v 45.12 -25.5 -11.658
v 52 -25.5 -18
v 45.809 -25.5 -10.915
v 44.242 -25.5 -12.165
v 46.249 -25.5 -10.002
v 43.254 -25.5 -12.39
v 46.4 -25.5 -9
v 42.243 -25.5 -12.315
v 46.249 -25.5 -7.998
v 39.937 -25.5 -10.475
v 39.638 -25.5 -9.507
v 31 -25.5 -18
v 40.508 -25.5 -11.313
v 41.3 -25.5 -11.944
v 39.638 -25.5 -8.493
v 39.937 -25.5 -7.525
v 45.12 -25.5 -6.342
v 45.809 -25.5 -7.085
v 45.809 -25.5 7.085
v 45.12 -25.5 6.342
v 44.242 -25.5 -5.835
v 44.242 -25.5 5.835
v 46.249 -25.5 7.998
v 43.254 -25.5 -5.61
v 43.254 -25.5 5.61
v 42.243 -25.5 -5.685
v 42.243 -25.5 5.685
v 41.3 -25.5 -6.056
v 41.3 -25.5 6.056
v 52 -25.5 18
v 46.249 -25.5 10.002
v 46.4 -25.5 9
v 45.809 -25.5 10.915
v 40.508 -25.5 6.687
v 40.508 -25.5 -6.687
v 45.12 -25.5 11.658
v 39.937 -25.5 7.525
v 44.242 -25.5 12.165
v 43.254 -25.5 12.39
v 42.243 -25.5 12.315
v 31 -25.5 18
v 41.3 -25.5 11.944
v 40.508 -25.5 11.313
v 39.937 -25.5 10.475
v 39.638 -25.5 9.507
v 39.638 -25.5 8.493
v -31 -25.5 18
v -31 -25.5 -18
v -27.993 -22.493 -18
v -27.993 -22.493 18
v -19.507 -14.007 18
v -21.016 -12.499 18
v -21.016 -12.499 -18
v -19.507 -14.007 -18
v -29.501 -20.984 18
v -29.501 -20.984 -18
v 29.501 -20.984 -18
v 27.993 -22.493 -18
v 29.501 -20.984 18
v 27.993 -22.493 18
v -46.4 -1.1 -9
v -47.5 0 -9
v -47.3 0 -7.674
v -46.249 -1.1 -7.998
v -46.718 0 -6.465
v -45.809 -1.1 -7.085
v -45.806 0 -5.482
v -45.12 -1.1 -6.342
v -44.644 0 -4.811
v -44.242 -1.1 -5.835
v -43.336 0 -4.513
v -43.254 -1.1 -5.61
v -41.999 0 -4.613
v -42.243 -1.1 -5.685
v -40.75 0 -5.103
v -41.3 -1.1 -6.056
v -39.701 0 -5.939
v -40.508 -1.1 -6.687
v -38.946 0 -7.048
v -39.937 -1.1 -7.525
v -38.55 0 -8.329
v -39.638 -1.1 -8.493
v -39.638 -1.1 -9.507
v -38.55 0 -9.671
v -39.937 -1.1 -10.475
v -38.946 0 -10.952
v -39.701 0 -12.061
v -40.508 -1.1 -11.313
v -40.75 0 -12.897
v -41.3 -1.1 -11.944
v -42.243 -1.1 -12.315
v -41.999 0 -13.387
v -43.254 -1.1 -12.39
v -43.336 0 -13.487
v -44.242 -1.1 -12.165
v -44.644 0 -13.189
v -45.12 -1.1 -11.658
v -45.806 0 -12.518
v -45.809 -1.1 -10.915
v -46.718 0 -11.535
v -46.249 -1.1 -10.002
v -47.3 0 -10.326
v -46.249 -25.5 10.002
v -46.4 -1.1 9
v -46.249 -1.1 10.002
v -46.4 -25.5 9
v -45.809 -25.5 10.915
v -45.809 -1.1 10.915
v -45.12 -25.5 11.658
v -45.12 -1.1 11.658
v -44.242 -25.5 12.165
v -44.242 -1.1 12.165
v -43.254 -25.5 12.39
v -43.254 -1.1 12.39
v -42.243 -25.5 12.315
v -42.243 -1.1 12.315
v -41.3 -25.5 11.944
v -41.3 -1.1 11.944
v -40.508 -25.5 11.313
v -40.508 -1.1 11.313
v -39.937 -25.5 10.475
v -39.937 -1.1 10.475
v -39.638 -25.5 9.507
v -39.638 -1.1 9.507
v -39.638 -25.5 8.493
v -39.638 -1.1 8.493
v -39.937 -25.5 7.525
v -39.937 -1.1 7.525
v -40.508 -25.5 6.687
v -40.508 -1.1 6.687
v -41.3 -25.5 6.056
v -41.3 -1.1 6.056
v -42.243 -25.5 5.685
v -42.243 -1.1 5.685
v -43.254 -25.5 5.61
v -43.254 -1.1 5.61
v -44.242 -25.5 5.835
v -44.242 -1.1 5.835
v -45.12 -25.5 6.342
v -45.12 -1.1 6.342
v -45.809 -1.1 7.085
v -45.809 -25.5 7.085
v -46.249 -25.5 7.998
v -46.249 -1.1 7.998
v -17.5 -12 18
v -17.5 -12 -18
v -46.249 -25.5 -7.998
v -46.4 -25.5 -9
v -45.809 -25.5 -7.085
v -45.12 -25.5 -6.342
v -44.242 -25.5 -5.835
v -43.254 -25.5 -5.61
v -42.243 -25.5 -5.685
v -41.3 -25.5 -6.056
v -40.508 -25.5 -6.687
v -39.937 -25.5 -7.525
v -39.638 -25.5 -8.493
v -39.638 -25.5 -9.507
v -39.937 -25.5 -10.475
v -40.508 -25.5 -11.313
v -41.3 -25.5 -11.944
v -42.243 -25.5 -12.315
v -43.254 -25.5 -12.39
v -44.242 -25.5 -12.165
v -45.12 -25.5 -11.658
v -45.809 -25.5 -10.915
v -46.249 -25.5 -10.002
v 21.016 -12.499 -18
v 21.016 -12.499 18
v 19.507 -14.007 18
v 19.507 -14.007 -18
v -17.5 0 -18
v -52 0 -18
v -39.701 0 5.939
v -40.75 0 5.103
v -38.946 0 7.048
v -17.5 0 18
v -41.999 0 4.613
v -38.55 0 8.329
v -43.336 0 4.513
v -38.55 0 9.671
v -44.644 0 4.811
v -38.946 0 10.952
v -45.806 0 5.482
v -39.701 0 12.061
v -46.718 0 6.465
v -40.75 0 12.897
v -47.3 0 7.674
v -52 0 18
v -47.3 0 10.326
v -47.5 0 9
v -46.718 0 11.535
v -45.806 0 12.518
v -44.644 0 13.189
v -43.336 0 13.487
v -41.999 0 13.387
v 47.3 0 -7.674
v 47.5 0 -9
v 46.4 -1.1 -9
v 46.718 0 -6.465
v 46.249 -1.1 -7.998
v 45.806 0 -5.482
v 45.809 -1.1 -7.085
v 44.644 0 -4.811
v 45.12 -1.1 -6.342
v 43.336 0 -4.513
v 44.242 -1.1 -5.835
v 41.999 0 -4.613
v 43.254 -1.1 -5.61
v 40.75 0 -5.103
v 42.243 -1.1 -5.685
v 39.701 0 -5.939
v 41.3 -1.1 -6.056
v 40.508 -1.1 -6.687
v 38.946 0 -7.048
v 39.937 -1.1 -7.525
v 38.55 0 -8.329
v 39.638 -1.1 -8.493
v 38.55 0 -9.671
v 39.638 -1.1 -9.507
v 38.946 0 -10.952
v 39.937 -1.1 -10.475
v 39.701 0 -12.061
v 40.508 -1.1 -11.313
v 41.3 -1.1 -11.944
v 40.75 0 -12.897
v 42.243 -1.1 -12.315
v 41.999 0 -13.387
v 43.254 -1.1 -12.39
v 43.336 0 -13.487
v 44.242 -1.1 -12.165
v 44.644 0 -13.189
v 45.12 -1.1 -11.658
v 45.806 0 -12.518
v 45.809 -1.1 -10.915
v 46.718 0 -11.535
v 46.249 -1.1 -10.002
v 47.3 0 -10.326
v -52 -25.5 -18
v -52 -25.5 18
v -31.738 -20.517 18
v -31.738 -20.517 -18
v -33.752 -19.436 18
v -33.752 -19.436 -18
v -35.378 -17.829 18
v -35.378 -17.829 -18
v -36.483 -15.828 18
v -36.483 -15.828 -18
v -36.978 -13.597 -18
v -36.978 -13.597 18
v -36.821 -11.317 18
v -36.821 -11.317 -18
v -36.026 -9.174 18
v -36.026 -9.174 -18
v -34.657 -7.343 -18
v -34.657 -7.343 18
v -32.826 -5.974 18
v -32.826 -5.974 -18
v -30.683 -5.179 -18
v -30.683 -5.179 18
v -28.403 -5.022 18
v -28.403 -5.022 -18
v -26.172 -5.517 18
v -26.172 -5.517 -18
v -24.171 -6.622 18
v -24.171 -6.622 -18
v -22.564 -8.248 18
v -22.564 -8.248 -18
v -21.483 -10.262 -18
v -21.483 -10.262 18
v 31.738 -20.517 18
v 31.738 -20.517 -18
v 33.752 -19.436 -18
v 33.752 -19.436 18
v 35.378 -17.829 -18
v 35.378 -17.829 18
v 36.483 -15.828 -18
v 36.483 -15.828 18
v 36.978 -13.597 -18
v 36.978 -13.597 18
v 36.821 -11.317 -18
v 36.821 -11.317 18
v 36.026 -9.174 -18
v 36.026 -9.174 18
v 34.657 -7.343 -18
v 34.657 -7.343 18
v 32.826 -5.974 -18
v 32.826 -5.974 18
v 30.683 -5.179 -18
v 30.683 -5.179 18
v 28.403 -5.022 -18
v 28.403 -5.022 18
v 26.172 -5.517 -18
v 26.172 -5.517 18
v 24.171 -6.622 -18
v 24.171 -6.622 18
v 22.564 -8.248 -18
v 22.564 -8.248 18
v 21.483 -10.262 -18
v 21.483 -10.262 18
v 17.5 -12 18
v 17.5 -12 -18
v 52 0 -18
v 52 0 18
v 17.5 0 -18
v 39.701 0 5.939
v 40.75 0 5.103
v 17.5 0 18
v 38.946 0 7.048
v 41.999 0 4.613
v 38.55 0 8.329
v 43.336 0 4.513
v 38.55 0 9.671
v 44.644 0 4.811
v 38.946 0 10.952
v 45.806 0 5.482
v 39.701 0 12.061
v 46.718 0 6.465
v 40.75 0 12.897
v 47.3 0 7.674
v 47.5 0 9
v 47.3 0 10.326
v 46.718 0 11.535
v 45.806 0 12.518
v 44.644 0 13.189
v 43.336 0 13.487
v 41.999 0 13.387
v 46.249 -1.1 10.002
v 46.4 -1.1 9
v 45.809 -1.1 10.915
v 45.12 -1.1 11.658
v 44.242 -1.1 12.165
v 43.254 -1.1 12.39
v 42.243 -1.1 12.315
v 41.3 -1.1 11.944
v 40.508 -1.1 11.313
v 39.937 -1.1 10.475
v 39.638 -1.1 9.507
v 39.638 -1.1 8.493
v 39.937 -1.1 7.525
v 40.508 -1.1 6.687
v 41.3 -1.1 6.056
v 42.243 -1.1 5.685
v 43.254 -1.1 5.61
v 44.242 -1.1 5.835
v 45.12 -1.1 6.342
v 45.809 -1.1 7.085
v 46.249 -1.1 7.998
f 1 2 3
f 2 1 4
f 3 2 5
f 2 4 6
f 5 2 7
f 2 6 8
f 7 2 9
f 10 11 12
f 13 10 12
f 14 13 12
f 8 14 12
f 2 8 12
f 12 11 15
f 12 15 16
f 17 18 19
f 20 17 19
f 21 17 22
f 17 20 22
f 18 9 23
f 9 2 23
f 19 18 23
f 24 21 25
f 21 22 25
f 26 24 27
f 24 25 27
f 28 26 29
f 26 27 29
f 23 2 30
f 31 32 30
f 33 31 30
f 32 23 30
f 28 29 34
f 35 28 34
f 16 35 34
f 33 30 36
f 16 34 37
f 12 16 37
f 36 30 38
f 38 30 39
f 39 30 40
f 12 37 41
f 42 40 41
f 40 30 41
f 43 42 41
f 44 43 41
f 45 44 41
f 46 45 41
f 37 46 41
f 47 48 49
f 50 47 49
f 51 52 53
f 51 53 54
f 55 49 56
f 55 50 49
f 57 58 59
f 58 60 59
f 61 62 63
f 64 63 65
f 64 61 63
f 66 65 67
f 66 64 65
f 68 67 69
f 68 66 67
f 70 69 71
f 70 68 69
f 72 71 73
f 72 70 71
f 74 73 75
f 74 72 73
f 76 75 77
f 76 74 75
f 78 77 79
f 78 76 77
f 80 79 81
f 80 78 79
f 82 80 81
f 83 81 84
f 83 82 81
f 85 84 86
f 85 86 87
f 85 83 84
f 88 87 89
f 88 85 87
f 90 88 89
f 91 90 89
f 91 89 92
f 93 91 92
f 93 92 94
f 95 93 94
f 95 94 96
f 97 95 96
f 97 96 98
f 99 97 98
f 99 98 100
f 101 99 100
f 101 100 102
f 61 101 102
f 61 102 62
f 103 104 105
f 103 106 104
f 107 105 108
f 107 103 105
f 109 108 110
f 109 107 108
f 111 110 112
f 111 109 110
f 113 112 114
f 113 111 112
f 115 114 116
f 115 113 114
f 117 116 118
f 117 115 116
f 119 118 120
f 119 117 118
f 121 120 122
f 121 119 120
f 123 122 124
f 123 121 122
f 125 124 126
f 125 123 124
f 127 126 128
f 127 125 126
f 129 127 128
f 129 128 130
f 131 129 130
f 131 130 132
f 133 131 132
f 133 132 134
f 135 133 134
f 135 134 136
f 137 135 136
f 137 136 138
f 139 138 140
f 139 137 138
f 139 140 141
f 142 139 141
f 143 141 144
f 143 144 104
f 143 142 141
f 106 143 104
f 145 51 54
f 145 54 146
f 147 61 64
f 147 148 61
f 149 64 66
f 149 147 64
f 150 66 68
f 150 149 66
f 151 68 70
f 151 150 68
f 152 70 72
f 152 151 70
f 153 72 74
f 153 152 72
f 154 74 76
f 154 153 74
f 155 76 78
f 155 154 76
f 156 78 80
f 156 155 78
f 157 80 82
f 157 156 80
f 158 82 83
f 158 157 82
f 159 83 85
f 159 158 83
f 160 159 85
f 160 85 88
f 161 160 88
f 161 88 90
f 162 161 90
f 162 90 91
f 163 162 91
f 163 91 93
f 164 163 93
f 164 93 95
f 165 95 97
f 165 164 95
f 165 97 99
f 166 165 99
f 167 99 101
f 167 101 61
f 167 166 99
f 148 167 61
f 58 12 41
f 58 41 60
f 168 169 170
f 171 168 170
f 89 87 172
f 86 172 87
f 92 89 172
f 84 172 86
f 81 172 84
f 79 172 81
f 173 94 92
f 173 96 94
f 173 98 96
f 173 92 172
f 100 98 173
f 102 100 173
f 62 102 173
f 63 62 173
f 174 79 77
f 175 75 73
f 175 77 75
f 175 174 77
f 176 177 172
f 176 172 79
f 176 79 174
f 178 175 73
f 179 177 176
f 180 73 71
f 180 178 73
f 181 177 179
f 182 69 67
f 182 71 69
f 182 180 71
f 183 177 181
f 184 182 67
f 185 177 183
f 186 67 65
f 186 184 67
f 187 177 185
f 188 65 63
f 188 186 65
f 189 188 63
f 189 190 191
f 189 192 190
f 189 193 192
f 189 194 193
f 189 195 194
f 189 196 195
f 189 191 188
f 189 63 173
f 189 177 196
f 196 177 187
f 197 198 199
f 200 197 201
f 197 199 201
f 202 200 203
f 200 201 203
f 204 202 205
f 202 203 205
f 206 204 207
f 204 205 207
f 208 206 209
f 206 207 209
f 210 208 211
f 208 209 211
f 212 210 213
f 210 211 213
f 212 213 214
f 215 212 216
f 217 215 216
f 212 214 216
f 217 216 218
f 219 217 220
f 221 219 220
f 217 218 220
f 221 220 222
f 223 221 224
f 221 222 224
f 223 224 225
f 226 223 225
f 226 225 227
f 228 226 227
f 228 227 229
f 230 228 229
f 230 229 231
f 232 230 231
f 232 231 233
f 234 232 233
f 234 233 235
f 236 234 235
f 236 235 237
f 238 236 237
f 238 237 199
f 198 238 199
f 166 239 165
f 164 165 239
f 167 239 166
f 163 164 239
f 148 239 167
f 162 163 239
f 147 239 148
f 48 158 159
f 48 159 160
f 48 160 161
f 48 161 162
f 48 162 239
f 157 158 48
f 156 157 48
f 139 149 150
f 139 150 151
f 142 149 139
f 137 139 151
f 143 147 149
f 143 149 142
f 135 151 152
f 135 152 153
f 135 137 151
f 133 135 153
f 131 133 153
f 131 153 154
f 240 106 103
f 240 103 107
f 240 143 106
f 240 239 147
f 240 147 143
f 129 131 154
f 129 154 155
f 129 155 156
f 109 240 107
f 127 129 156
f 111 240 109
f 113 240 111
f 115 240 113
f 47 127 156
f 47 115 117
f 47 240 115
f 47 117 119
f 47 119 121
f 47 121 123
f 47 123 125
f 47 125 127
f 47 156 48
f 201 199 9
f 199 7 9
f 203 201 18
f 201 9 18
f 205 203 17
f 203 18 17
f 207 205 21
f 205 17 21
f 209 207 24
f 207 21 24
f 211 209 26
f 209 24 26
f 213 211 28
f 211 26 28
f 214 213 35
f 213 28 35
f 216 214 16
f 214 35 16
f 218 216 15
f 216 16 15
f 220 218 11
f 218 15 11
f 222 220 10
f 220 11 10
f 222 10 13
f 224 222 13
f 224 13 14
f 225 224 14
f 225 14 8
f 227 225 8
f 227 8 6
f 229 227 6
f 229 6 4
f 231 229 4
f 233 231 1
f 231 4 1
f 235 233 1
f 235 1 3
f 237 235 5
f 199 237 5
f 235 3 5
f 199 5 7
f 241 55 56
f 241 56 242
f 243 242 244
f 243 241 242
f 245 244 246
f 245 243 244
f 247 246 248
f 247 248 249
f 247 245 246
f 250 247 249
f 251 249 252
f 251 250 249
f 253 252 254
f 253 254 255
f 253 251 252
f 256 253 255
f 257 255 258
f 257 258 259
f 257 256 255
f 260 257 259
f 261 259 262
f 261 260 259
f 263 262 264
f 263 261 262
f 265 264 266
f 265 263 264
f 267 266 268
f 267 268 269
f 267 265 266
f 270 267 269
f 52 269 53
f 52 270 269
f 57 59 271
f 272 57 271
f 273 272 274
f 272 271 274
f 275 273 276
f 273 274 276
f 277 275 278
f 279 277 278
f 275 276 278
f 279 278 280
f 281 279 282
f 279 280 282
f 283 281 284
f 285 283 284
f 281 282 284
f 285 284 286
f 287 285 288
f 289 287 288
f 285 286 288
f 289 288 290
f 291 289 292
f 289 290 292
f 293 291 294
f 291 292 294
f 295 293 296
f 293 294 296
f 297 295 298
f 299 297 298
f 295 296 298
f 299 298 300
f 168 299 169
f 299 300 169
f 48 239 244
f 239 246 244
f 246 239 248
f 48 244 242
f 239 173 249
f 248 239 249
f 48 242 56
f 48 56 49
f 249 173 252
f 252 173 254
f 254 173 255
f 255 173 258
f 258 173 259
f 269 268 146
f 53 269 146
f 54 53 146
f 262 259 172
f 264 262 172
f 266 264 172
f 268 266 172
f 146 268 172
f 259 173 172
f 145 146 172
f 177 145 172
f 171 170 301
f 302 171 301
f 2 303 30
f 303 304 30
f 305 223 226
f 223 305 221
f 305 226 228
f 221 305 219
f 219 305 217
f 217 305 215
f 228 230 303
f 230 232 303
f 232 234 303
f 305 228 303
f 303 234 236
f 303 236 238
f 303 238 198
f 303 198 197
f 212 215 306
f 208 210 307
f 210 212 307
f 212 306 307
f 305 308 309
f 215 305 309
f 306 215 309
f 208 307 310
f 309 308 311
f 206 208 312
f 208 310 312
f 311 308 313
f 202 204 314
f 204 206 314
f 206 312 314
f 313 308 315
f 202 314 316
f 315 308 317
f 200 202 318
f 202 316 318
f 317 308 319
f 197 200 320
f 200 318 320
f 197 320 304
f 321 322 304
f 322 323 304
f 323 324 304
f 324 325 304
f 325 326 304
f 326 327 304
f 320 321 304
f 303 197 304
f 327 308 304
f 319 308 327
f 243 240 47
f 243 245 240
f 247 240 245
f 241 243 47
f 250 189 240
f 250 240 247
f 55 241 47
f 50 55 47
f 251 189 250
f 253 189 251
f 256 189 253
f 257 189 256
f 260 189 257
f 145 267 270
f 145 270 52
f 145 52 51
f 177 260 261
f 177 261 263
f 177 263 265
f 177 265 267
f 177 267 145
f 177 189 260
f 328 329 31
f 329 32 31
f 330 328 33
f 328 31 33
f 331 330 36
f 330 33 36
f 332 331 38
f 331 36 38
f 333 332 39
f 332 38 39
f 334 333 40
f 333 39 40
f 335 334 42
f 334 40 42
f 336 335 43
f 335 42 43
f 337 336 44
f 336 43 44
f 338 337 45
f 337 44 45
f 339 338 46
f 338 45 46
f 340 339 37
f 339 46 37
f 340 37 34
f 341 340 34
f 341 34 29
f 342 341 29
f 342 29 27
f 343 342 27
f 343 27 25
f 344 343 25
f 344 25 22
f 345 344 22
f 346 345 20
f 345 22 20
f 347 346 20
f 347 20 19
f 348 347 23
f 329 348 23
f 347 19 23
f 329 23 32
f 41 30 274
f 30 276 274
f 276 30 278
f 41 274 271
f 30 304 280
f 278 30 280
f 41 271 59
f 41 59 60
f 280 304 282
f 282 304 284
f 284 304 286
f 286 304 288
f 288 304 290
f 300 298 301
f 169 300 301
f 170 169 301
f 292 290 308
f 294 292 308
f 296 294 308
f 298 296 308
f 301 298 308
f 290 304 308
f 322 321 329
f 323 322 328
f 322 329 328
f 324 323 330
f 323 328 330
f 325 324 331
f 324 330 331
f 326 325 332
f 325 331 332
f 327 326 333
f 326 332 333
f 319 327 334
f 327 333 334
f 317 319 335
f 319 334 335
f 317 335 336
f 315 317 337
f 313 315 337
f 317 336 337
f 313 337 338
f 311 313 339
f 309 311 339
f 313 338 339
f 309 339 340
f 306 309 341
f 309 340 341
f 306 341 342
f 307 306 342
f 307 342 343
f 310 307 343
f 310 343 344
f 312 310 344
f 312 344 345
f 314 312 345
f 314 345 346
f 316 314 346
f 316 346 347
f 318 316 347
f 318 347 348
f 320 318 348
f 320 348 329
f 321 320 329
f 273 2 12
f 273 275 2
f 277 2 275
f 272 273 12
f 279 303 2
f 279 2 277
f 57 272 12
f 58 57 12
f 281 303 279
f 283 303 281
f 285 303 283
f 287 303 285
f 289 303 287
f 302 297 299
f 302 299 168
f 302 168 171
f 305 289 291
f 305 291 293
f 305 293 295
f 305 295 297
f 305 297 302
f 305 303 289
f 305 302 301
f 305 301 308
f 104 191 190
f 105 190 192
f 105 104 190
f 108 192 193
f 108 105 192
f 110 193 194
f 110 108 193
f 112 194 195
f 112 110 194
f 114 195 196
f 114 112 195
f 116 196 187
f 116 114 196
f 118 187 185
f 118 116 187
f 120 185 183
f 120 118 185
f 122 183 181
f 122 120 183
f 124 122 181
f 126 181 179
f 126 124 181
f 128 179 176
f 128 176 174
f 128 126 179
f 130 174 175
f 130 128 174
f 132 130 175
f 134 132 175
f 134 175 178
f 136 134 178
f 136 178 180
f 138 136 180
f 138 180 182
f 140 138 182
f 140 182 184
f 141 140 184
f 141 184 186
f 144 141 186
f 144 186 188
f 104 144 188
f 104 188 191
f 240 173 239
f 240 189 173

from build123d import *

# Parameters (mm, degrees)
BOSS_EXTRUDE1_DEPTH              = 18
M8X1_25_TAPPED_HOLE1_D           = 6.8
M8X1_25_TAPPED_HOLE1_CSINK_D     = 9
M8X1_25_TAPPED_HOLE1_CSINK_ANGLE = 90


with BuildPart() as part:
    # Sketch1 → Boss-Extrude1 (new, symmetric)
    with BuildSketch(Plane.XY):
        with BuildLine():
            Line((19.507359313, -14.007359313), (17.5, -12))
            Line((17.5, -12), (17.5, 0))
            Line((17.5, 0), (52, 0))
            Line((52, 0), (52, -25.5))
            Line((52, -25.5), (31, -25.5))
            Line((31, -25.5), (27.992640687, -22.492640687))
            Line((27.992640687, -22.492640687), (29.5009833, -20.984298074))
            ThreePointArc((29.5009833, -20.984298074), (34.656854249, -7.343145751), (21.015701926, -12.4990167))
            Line((21.015701926, -12.4990167), (19.507359313, -14.007359313))
        make_face()
    extrude(amount=BOSS_EXTRUDE1_DEPTH, both=True)

    # M8x1.25 Tapped Hole1 (through all)
    with Locations(Plane(origin=(0, 0, 0), x_dir=(-1, 0, 0), z_dir=(0, 1, 0))):
        with Locations((-43, -9), (-43, 9)):
            CounterSinkHole(M8X1_25_TAPPED_HOLE1_D / 2, M8X1_25_TAPPED_HOLE1_CSINK_D / 2, counter_sink_angle=M8X1_25_TAPPED_HOLE1_CSINK_ANGLE)


with BuildPart() as body_2:
    # Mirror2: mirrored copy
    add(part.part.mirror(Plane(origin=(0, 0, 0), x_dir=(0, 0, 1), z_dir=(1, 0, 0))))


solid = Compound([part.part, body_2.part])
